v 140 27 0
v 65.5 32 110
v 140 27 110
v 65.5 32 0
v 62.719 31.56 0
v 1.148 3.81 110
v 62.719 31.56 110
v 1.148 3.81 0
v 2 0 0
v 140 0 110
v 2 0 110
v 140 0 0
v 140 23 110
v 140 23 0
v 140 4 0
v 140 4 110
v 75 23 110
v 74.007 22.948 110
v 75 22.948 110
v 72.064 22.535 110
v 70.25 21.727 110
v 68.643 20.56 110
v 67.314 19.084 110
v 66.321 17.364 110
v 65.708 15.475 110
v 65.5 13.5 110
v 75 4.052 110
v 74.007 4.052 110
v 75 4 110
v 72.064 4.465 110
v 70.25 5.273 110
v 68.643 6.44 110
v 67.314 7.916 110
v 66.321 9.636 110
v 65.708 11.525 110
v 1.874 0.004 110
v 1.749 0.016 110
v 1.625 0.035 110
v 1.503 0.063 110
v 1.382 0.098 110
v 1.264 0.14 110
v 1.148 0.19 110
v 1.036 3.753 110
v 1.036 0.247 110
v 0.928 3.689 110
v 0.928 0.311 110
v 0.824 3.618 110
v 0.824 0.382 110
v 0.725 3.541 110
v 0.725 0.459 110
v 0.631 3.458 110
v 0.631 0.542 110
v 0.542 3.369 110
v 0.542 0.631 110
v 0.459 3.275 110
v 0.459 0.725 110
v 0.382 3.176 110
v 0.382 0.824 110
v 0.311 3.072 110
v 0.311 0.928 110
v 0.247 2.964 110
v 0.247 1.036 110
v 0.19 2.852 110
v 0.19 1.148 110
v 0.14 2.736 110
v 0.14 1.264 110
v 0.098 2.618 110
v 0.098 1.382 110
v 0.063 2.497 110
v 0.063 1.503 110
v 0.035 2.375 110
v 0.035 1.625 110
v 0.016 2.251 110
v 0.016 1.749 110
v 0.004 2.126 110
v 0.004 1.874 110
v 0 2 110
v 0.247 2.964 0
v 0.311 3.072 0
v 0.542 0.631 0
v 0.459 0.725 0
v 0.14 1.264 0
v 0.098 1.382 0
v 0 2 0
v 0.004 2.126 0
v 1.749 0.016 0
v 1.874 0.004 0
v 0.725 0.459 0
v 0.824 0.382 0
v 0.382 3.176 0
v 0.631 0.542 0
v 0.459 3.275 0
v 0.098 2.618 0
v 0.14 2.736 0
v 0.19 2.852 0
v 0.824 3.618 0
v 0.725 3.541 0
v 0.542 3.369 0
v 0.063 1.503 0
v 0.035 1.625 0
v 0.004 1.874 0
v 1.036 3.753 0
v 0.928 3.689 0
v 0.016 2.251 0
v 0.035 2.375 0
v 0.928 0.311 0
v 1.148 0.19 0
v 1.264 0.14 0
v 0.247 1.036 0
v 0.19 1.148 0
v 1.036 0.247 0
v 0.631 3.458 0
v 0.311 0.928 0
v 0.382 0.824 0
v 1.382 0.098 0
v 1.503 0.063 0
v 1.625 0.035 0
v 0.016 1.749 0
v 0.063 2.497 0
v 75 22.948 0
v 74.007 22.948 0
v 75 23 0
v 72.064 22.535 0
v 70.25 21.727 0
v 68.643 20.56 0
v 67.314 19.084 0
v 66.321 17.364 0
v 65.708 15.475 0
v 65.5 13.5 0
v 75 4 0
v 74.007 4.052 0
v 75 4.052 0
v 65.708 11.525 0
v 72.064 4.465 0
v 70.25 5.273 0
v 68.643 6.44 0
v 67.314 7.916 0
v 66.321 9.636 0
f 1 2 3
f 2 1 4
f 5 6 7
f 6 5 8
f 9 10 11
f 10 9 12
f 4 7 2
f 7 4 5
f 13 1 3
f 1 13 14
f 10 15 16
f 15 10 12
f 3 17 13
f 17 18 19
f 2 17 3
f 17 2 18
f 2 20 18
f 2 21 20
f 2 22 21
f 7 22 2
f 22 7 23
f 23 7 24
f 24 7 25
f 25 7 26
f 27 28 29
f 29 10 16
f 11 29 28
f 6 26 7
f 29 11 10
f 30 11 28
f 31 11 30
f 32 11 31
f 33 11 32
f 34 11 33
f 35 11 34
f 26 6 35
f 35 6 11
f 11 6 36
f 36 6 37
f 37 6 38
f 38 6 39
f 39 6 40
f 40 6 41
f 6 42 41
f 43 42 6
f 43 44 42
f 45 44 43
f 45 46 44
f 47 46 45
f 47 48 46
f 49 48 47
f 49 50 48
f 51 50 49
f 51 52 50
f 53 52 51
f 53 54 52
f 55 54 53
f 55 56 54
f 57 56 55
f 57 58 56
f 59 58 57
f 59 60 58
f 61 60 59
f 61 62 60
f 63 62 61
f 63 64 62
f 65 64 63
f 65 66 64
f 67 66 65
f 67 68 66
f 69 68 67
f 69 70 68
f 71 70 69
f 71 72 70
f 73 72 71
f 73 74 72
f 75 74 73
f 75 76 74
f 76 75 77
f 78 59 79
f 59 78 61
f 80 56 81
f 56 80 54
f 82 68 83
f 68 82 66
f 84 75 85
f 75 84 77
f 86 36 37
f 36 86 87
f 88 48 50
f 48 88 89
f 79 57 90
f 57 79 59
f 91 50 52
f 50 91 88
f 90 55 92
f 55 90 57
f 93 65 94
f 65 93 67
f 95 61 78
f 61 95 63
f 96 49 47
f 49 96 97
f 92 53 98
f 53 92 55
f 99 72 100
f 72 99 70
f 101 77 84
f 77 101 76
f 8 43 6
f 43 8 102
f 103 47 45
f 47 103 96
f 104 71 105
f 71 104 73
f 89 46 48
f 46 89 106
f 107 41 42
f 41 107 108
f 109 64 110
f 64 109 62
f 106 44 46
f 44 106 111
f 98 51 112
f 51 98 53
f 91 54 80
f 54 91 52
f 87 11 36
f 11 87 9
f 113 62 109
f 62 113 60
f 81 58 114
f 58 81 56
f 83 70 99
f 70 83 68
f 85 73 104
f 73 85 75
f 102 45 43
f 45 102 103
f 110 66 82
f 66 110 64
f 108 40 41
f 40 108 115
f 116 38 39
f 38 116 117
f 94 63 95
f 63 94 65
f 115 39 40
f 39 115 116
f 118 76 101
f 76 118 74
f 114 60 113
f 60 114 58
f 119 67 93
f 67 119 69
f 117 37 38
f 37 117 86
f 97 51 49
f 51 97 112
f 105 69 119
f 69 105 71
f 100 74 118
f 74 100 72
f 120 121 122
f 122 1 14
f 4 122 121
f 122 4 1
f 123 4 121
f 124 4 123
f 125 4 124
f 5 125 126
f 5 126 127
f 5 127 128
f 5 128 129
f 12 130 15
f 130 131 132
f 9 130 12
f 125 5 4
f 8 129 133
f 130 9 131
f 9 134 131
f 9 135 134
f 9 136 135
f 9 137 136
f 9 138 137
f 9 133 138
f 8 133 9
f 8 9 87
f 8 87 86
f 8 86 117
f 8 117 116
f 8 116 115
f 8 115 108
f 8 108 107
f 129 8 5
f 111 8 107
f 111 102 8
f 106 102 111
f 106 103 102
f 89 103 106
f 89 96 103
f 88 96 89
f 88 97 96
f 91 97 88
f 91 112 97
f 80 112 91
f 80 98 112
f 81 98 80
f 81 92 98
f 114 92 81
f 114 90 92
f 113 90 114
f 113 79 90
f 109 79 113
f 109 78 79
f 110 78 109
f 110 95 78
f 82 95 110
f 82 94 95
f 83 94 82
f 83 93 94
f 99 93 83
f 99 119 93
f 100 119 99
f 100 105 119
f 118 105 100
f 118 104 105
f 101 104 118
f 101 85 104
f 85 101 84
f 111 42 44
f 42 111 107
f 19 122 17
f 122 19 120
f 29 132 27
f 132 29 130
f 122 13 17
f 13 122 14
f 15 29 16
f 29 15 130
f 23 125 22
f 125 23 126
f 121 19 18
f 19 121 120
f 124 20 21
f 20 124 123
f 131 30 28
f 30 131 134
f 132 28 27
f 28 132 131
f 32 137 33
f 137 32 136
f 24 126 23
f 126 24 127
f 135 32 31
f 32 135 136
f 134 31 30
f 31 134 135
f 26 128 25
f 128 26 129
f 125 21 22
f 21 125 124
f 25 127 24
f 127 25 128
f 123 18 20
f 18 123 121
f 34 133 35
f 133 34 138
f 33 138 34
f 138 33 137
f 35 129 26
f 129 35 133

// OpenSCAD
/* Shelf Extension
Daniel Urquhart 2017

This is a brance intended to sit under my monitor and allow it to be
pushed back past the edge of the desk by a few cm further.

*/

//total depth of the support
totalDepth= 140;

//portion of support that extends beyond table edge
extDepth = 75;

//length of support (z axis)
length = 110;

//thickness under monitor
topHeight = 4; //[0.8:10]

//thickness of table edge
gapHeight = 19; //[5,50]

//min thickness of lower support
minBaseHeight = 4; //[2:10]

//thickness of lower support just below table edge
maxBaseHeight = 18;//[4:10]

//Epsilon used to improve openSCAD visualziation... some small value >= 0
e=0.01;

extraBaseRadius = (maxBaseHeight)/2;

difference(){
    hull()
    {
    translate([extDepth-gapHeight/2,0,0])
        cube([totalDepth-extDepth+gapHeight/2,topHeight+gapHeight+minBaseHeight, length]);
    translate([(topHeight)/2,(topHeight)/2,0])
        cylinder(length, r=(topHeight)/2,$fn=100);
    translate([extDepth-gapHeight/2,topHeight+gapHeight,0])
        cylinder(length, r=extraBaseRadius,$fn=20);
    
    }
    translate([extDepth,topHeight,0-e]) {
        cube([totalDepth,gapHeight, length+2*e]);
    }
    translate([extDepth,topHeight+gapHeight/2,0-e]) {
        cylinder(length+2*e,r=gapHeight/2);
    }
    
}
